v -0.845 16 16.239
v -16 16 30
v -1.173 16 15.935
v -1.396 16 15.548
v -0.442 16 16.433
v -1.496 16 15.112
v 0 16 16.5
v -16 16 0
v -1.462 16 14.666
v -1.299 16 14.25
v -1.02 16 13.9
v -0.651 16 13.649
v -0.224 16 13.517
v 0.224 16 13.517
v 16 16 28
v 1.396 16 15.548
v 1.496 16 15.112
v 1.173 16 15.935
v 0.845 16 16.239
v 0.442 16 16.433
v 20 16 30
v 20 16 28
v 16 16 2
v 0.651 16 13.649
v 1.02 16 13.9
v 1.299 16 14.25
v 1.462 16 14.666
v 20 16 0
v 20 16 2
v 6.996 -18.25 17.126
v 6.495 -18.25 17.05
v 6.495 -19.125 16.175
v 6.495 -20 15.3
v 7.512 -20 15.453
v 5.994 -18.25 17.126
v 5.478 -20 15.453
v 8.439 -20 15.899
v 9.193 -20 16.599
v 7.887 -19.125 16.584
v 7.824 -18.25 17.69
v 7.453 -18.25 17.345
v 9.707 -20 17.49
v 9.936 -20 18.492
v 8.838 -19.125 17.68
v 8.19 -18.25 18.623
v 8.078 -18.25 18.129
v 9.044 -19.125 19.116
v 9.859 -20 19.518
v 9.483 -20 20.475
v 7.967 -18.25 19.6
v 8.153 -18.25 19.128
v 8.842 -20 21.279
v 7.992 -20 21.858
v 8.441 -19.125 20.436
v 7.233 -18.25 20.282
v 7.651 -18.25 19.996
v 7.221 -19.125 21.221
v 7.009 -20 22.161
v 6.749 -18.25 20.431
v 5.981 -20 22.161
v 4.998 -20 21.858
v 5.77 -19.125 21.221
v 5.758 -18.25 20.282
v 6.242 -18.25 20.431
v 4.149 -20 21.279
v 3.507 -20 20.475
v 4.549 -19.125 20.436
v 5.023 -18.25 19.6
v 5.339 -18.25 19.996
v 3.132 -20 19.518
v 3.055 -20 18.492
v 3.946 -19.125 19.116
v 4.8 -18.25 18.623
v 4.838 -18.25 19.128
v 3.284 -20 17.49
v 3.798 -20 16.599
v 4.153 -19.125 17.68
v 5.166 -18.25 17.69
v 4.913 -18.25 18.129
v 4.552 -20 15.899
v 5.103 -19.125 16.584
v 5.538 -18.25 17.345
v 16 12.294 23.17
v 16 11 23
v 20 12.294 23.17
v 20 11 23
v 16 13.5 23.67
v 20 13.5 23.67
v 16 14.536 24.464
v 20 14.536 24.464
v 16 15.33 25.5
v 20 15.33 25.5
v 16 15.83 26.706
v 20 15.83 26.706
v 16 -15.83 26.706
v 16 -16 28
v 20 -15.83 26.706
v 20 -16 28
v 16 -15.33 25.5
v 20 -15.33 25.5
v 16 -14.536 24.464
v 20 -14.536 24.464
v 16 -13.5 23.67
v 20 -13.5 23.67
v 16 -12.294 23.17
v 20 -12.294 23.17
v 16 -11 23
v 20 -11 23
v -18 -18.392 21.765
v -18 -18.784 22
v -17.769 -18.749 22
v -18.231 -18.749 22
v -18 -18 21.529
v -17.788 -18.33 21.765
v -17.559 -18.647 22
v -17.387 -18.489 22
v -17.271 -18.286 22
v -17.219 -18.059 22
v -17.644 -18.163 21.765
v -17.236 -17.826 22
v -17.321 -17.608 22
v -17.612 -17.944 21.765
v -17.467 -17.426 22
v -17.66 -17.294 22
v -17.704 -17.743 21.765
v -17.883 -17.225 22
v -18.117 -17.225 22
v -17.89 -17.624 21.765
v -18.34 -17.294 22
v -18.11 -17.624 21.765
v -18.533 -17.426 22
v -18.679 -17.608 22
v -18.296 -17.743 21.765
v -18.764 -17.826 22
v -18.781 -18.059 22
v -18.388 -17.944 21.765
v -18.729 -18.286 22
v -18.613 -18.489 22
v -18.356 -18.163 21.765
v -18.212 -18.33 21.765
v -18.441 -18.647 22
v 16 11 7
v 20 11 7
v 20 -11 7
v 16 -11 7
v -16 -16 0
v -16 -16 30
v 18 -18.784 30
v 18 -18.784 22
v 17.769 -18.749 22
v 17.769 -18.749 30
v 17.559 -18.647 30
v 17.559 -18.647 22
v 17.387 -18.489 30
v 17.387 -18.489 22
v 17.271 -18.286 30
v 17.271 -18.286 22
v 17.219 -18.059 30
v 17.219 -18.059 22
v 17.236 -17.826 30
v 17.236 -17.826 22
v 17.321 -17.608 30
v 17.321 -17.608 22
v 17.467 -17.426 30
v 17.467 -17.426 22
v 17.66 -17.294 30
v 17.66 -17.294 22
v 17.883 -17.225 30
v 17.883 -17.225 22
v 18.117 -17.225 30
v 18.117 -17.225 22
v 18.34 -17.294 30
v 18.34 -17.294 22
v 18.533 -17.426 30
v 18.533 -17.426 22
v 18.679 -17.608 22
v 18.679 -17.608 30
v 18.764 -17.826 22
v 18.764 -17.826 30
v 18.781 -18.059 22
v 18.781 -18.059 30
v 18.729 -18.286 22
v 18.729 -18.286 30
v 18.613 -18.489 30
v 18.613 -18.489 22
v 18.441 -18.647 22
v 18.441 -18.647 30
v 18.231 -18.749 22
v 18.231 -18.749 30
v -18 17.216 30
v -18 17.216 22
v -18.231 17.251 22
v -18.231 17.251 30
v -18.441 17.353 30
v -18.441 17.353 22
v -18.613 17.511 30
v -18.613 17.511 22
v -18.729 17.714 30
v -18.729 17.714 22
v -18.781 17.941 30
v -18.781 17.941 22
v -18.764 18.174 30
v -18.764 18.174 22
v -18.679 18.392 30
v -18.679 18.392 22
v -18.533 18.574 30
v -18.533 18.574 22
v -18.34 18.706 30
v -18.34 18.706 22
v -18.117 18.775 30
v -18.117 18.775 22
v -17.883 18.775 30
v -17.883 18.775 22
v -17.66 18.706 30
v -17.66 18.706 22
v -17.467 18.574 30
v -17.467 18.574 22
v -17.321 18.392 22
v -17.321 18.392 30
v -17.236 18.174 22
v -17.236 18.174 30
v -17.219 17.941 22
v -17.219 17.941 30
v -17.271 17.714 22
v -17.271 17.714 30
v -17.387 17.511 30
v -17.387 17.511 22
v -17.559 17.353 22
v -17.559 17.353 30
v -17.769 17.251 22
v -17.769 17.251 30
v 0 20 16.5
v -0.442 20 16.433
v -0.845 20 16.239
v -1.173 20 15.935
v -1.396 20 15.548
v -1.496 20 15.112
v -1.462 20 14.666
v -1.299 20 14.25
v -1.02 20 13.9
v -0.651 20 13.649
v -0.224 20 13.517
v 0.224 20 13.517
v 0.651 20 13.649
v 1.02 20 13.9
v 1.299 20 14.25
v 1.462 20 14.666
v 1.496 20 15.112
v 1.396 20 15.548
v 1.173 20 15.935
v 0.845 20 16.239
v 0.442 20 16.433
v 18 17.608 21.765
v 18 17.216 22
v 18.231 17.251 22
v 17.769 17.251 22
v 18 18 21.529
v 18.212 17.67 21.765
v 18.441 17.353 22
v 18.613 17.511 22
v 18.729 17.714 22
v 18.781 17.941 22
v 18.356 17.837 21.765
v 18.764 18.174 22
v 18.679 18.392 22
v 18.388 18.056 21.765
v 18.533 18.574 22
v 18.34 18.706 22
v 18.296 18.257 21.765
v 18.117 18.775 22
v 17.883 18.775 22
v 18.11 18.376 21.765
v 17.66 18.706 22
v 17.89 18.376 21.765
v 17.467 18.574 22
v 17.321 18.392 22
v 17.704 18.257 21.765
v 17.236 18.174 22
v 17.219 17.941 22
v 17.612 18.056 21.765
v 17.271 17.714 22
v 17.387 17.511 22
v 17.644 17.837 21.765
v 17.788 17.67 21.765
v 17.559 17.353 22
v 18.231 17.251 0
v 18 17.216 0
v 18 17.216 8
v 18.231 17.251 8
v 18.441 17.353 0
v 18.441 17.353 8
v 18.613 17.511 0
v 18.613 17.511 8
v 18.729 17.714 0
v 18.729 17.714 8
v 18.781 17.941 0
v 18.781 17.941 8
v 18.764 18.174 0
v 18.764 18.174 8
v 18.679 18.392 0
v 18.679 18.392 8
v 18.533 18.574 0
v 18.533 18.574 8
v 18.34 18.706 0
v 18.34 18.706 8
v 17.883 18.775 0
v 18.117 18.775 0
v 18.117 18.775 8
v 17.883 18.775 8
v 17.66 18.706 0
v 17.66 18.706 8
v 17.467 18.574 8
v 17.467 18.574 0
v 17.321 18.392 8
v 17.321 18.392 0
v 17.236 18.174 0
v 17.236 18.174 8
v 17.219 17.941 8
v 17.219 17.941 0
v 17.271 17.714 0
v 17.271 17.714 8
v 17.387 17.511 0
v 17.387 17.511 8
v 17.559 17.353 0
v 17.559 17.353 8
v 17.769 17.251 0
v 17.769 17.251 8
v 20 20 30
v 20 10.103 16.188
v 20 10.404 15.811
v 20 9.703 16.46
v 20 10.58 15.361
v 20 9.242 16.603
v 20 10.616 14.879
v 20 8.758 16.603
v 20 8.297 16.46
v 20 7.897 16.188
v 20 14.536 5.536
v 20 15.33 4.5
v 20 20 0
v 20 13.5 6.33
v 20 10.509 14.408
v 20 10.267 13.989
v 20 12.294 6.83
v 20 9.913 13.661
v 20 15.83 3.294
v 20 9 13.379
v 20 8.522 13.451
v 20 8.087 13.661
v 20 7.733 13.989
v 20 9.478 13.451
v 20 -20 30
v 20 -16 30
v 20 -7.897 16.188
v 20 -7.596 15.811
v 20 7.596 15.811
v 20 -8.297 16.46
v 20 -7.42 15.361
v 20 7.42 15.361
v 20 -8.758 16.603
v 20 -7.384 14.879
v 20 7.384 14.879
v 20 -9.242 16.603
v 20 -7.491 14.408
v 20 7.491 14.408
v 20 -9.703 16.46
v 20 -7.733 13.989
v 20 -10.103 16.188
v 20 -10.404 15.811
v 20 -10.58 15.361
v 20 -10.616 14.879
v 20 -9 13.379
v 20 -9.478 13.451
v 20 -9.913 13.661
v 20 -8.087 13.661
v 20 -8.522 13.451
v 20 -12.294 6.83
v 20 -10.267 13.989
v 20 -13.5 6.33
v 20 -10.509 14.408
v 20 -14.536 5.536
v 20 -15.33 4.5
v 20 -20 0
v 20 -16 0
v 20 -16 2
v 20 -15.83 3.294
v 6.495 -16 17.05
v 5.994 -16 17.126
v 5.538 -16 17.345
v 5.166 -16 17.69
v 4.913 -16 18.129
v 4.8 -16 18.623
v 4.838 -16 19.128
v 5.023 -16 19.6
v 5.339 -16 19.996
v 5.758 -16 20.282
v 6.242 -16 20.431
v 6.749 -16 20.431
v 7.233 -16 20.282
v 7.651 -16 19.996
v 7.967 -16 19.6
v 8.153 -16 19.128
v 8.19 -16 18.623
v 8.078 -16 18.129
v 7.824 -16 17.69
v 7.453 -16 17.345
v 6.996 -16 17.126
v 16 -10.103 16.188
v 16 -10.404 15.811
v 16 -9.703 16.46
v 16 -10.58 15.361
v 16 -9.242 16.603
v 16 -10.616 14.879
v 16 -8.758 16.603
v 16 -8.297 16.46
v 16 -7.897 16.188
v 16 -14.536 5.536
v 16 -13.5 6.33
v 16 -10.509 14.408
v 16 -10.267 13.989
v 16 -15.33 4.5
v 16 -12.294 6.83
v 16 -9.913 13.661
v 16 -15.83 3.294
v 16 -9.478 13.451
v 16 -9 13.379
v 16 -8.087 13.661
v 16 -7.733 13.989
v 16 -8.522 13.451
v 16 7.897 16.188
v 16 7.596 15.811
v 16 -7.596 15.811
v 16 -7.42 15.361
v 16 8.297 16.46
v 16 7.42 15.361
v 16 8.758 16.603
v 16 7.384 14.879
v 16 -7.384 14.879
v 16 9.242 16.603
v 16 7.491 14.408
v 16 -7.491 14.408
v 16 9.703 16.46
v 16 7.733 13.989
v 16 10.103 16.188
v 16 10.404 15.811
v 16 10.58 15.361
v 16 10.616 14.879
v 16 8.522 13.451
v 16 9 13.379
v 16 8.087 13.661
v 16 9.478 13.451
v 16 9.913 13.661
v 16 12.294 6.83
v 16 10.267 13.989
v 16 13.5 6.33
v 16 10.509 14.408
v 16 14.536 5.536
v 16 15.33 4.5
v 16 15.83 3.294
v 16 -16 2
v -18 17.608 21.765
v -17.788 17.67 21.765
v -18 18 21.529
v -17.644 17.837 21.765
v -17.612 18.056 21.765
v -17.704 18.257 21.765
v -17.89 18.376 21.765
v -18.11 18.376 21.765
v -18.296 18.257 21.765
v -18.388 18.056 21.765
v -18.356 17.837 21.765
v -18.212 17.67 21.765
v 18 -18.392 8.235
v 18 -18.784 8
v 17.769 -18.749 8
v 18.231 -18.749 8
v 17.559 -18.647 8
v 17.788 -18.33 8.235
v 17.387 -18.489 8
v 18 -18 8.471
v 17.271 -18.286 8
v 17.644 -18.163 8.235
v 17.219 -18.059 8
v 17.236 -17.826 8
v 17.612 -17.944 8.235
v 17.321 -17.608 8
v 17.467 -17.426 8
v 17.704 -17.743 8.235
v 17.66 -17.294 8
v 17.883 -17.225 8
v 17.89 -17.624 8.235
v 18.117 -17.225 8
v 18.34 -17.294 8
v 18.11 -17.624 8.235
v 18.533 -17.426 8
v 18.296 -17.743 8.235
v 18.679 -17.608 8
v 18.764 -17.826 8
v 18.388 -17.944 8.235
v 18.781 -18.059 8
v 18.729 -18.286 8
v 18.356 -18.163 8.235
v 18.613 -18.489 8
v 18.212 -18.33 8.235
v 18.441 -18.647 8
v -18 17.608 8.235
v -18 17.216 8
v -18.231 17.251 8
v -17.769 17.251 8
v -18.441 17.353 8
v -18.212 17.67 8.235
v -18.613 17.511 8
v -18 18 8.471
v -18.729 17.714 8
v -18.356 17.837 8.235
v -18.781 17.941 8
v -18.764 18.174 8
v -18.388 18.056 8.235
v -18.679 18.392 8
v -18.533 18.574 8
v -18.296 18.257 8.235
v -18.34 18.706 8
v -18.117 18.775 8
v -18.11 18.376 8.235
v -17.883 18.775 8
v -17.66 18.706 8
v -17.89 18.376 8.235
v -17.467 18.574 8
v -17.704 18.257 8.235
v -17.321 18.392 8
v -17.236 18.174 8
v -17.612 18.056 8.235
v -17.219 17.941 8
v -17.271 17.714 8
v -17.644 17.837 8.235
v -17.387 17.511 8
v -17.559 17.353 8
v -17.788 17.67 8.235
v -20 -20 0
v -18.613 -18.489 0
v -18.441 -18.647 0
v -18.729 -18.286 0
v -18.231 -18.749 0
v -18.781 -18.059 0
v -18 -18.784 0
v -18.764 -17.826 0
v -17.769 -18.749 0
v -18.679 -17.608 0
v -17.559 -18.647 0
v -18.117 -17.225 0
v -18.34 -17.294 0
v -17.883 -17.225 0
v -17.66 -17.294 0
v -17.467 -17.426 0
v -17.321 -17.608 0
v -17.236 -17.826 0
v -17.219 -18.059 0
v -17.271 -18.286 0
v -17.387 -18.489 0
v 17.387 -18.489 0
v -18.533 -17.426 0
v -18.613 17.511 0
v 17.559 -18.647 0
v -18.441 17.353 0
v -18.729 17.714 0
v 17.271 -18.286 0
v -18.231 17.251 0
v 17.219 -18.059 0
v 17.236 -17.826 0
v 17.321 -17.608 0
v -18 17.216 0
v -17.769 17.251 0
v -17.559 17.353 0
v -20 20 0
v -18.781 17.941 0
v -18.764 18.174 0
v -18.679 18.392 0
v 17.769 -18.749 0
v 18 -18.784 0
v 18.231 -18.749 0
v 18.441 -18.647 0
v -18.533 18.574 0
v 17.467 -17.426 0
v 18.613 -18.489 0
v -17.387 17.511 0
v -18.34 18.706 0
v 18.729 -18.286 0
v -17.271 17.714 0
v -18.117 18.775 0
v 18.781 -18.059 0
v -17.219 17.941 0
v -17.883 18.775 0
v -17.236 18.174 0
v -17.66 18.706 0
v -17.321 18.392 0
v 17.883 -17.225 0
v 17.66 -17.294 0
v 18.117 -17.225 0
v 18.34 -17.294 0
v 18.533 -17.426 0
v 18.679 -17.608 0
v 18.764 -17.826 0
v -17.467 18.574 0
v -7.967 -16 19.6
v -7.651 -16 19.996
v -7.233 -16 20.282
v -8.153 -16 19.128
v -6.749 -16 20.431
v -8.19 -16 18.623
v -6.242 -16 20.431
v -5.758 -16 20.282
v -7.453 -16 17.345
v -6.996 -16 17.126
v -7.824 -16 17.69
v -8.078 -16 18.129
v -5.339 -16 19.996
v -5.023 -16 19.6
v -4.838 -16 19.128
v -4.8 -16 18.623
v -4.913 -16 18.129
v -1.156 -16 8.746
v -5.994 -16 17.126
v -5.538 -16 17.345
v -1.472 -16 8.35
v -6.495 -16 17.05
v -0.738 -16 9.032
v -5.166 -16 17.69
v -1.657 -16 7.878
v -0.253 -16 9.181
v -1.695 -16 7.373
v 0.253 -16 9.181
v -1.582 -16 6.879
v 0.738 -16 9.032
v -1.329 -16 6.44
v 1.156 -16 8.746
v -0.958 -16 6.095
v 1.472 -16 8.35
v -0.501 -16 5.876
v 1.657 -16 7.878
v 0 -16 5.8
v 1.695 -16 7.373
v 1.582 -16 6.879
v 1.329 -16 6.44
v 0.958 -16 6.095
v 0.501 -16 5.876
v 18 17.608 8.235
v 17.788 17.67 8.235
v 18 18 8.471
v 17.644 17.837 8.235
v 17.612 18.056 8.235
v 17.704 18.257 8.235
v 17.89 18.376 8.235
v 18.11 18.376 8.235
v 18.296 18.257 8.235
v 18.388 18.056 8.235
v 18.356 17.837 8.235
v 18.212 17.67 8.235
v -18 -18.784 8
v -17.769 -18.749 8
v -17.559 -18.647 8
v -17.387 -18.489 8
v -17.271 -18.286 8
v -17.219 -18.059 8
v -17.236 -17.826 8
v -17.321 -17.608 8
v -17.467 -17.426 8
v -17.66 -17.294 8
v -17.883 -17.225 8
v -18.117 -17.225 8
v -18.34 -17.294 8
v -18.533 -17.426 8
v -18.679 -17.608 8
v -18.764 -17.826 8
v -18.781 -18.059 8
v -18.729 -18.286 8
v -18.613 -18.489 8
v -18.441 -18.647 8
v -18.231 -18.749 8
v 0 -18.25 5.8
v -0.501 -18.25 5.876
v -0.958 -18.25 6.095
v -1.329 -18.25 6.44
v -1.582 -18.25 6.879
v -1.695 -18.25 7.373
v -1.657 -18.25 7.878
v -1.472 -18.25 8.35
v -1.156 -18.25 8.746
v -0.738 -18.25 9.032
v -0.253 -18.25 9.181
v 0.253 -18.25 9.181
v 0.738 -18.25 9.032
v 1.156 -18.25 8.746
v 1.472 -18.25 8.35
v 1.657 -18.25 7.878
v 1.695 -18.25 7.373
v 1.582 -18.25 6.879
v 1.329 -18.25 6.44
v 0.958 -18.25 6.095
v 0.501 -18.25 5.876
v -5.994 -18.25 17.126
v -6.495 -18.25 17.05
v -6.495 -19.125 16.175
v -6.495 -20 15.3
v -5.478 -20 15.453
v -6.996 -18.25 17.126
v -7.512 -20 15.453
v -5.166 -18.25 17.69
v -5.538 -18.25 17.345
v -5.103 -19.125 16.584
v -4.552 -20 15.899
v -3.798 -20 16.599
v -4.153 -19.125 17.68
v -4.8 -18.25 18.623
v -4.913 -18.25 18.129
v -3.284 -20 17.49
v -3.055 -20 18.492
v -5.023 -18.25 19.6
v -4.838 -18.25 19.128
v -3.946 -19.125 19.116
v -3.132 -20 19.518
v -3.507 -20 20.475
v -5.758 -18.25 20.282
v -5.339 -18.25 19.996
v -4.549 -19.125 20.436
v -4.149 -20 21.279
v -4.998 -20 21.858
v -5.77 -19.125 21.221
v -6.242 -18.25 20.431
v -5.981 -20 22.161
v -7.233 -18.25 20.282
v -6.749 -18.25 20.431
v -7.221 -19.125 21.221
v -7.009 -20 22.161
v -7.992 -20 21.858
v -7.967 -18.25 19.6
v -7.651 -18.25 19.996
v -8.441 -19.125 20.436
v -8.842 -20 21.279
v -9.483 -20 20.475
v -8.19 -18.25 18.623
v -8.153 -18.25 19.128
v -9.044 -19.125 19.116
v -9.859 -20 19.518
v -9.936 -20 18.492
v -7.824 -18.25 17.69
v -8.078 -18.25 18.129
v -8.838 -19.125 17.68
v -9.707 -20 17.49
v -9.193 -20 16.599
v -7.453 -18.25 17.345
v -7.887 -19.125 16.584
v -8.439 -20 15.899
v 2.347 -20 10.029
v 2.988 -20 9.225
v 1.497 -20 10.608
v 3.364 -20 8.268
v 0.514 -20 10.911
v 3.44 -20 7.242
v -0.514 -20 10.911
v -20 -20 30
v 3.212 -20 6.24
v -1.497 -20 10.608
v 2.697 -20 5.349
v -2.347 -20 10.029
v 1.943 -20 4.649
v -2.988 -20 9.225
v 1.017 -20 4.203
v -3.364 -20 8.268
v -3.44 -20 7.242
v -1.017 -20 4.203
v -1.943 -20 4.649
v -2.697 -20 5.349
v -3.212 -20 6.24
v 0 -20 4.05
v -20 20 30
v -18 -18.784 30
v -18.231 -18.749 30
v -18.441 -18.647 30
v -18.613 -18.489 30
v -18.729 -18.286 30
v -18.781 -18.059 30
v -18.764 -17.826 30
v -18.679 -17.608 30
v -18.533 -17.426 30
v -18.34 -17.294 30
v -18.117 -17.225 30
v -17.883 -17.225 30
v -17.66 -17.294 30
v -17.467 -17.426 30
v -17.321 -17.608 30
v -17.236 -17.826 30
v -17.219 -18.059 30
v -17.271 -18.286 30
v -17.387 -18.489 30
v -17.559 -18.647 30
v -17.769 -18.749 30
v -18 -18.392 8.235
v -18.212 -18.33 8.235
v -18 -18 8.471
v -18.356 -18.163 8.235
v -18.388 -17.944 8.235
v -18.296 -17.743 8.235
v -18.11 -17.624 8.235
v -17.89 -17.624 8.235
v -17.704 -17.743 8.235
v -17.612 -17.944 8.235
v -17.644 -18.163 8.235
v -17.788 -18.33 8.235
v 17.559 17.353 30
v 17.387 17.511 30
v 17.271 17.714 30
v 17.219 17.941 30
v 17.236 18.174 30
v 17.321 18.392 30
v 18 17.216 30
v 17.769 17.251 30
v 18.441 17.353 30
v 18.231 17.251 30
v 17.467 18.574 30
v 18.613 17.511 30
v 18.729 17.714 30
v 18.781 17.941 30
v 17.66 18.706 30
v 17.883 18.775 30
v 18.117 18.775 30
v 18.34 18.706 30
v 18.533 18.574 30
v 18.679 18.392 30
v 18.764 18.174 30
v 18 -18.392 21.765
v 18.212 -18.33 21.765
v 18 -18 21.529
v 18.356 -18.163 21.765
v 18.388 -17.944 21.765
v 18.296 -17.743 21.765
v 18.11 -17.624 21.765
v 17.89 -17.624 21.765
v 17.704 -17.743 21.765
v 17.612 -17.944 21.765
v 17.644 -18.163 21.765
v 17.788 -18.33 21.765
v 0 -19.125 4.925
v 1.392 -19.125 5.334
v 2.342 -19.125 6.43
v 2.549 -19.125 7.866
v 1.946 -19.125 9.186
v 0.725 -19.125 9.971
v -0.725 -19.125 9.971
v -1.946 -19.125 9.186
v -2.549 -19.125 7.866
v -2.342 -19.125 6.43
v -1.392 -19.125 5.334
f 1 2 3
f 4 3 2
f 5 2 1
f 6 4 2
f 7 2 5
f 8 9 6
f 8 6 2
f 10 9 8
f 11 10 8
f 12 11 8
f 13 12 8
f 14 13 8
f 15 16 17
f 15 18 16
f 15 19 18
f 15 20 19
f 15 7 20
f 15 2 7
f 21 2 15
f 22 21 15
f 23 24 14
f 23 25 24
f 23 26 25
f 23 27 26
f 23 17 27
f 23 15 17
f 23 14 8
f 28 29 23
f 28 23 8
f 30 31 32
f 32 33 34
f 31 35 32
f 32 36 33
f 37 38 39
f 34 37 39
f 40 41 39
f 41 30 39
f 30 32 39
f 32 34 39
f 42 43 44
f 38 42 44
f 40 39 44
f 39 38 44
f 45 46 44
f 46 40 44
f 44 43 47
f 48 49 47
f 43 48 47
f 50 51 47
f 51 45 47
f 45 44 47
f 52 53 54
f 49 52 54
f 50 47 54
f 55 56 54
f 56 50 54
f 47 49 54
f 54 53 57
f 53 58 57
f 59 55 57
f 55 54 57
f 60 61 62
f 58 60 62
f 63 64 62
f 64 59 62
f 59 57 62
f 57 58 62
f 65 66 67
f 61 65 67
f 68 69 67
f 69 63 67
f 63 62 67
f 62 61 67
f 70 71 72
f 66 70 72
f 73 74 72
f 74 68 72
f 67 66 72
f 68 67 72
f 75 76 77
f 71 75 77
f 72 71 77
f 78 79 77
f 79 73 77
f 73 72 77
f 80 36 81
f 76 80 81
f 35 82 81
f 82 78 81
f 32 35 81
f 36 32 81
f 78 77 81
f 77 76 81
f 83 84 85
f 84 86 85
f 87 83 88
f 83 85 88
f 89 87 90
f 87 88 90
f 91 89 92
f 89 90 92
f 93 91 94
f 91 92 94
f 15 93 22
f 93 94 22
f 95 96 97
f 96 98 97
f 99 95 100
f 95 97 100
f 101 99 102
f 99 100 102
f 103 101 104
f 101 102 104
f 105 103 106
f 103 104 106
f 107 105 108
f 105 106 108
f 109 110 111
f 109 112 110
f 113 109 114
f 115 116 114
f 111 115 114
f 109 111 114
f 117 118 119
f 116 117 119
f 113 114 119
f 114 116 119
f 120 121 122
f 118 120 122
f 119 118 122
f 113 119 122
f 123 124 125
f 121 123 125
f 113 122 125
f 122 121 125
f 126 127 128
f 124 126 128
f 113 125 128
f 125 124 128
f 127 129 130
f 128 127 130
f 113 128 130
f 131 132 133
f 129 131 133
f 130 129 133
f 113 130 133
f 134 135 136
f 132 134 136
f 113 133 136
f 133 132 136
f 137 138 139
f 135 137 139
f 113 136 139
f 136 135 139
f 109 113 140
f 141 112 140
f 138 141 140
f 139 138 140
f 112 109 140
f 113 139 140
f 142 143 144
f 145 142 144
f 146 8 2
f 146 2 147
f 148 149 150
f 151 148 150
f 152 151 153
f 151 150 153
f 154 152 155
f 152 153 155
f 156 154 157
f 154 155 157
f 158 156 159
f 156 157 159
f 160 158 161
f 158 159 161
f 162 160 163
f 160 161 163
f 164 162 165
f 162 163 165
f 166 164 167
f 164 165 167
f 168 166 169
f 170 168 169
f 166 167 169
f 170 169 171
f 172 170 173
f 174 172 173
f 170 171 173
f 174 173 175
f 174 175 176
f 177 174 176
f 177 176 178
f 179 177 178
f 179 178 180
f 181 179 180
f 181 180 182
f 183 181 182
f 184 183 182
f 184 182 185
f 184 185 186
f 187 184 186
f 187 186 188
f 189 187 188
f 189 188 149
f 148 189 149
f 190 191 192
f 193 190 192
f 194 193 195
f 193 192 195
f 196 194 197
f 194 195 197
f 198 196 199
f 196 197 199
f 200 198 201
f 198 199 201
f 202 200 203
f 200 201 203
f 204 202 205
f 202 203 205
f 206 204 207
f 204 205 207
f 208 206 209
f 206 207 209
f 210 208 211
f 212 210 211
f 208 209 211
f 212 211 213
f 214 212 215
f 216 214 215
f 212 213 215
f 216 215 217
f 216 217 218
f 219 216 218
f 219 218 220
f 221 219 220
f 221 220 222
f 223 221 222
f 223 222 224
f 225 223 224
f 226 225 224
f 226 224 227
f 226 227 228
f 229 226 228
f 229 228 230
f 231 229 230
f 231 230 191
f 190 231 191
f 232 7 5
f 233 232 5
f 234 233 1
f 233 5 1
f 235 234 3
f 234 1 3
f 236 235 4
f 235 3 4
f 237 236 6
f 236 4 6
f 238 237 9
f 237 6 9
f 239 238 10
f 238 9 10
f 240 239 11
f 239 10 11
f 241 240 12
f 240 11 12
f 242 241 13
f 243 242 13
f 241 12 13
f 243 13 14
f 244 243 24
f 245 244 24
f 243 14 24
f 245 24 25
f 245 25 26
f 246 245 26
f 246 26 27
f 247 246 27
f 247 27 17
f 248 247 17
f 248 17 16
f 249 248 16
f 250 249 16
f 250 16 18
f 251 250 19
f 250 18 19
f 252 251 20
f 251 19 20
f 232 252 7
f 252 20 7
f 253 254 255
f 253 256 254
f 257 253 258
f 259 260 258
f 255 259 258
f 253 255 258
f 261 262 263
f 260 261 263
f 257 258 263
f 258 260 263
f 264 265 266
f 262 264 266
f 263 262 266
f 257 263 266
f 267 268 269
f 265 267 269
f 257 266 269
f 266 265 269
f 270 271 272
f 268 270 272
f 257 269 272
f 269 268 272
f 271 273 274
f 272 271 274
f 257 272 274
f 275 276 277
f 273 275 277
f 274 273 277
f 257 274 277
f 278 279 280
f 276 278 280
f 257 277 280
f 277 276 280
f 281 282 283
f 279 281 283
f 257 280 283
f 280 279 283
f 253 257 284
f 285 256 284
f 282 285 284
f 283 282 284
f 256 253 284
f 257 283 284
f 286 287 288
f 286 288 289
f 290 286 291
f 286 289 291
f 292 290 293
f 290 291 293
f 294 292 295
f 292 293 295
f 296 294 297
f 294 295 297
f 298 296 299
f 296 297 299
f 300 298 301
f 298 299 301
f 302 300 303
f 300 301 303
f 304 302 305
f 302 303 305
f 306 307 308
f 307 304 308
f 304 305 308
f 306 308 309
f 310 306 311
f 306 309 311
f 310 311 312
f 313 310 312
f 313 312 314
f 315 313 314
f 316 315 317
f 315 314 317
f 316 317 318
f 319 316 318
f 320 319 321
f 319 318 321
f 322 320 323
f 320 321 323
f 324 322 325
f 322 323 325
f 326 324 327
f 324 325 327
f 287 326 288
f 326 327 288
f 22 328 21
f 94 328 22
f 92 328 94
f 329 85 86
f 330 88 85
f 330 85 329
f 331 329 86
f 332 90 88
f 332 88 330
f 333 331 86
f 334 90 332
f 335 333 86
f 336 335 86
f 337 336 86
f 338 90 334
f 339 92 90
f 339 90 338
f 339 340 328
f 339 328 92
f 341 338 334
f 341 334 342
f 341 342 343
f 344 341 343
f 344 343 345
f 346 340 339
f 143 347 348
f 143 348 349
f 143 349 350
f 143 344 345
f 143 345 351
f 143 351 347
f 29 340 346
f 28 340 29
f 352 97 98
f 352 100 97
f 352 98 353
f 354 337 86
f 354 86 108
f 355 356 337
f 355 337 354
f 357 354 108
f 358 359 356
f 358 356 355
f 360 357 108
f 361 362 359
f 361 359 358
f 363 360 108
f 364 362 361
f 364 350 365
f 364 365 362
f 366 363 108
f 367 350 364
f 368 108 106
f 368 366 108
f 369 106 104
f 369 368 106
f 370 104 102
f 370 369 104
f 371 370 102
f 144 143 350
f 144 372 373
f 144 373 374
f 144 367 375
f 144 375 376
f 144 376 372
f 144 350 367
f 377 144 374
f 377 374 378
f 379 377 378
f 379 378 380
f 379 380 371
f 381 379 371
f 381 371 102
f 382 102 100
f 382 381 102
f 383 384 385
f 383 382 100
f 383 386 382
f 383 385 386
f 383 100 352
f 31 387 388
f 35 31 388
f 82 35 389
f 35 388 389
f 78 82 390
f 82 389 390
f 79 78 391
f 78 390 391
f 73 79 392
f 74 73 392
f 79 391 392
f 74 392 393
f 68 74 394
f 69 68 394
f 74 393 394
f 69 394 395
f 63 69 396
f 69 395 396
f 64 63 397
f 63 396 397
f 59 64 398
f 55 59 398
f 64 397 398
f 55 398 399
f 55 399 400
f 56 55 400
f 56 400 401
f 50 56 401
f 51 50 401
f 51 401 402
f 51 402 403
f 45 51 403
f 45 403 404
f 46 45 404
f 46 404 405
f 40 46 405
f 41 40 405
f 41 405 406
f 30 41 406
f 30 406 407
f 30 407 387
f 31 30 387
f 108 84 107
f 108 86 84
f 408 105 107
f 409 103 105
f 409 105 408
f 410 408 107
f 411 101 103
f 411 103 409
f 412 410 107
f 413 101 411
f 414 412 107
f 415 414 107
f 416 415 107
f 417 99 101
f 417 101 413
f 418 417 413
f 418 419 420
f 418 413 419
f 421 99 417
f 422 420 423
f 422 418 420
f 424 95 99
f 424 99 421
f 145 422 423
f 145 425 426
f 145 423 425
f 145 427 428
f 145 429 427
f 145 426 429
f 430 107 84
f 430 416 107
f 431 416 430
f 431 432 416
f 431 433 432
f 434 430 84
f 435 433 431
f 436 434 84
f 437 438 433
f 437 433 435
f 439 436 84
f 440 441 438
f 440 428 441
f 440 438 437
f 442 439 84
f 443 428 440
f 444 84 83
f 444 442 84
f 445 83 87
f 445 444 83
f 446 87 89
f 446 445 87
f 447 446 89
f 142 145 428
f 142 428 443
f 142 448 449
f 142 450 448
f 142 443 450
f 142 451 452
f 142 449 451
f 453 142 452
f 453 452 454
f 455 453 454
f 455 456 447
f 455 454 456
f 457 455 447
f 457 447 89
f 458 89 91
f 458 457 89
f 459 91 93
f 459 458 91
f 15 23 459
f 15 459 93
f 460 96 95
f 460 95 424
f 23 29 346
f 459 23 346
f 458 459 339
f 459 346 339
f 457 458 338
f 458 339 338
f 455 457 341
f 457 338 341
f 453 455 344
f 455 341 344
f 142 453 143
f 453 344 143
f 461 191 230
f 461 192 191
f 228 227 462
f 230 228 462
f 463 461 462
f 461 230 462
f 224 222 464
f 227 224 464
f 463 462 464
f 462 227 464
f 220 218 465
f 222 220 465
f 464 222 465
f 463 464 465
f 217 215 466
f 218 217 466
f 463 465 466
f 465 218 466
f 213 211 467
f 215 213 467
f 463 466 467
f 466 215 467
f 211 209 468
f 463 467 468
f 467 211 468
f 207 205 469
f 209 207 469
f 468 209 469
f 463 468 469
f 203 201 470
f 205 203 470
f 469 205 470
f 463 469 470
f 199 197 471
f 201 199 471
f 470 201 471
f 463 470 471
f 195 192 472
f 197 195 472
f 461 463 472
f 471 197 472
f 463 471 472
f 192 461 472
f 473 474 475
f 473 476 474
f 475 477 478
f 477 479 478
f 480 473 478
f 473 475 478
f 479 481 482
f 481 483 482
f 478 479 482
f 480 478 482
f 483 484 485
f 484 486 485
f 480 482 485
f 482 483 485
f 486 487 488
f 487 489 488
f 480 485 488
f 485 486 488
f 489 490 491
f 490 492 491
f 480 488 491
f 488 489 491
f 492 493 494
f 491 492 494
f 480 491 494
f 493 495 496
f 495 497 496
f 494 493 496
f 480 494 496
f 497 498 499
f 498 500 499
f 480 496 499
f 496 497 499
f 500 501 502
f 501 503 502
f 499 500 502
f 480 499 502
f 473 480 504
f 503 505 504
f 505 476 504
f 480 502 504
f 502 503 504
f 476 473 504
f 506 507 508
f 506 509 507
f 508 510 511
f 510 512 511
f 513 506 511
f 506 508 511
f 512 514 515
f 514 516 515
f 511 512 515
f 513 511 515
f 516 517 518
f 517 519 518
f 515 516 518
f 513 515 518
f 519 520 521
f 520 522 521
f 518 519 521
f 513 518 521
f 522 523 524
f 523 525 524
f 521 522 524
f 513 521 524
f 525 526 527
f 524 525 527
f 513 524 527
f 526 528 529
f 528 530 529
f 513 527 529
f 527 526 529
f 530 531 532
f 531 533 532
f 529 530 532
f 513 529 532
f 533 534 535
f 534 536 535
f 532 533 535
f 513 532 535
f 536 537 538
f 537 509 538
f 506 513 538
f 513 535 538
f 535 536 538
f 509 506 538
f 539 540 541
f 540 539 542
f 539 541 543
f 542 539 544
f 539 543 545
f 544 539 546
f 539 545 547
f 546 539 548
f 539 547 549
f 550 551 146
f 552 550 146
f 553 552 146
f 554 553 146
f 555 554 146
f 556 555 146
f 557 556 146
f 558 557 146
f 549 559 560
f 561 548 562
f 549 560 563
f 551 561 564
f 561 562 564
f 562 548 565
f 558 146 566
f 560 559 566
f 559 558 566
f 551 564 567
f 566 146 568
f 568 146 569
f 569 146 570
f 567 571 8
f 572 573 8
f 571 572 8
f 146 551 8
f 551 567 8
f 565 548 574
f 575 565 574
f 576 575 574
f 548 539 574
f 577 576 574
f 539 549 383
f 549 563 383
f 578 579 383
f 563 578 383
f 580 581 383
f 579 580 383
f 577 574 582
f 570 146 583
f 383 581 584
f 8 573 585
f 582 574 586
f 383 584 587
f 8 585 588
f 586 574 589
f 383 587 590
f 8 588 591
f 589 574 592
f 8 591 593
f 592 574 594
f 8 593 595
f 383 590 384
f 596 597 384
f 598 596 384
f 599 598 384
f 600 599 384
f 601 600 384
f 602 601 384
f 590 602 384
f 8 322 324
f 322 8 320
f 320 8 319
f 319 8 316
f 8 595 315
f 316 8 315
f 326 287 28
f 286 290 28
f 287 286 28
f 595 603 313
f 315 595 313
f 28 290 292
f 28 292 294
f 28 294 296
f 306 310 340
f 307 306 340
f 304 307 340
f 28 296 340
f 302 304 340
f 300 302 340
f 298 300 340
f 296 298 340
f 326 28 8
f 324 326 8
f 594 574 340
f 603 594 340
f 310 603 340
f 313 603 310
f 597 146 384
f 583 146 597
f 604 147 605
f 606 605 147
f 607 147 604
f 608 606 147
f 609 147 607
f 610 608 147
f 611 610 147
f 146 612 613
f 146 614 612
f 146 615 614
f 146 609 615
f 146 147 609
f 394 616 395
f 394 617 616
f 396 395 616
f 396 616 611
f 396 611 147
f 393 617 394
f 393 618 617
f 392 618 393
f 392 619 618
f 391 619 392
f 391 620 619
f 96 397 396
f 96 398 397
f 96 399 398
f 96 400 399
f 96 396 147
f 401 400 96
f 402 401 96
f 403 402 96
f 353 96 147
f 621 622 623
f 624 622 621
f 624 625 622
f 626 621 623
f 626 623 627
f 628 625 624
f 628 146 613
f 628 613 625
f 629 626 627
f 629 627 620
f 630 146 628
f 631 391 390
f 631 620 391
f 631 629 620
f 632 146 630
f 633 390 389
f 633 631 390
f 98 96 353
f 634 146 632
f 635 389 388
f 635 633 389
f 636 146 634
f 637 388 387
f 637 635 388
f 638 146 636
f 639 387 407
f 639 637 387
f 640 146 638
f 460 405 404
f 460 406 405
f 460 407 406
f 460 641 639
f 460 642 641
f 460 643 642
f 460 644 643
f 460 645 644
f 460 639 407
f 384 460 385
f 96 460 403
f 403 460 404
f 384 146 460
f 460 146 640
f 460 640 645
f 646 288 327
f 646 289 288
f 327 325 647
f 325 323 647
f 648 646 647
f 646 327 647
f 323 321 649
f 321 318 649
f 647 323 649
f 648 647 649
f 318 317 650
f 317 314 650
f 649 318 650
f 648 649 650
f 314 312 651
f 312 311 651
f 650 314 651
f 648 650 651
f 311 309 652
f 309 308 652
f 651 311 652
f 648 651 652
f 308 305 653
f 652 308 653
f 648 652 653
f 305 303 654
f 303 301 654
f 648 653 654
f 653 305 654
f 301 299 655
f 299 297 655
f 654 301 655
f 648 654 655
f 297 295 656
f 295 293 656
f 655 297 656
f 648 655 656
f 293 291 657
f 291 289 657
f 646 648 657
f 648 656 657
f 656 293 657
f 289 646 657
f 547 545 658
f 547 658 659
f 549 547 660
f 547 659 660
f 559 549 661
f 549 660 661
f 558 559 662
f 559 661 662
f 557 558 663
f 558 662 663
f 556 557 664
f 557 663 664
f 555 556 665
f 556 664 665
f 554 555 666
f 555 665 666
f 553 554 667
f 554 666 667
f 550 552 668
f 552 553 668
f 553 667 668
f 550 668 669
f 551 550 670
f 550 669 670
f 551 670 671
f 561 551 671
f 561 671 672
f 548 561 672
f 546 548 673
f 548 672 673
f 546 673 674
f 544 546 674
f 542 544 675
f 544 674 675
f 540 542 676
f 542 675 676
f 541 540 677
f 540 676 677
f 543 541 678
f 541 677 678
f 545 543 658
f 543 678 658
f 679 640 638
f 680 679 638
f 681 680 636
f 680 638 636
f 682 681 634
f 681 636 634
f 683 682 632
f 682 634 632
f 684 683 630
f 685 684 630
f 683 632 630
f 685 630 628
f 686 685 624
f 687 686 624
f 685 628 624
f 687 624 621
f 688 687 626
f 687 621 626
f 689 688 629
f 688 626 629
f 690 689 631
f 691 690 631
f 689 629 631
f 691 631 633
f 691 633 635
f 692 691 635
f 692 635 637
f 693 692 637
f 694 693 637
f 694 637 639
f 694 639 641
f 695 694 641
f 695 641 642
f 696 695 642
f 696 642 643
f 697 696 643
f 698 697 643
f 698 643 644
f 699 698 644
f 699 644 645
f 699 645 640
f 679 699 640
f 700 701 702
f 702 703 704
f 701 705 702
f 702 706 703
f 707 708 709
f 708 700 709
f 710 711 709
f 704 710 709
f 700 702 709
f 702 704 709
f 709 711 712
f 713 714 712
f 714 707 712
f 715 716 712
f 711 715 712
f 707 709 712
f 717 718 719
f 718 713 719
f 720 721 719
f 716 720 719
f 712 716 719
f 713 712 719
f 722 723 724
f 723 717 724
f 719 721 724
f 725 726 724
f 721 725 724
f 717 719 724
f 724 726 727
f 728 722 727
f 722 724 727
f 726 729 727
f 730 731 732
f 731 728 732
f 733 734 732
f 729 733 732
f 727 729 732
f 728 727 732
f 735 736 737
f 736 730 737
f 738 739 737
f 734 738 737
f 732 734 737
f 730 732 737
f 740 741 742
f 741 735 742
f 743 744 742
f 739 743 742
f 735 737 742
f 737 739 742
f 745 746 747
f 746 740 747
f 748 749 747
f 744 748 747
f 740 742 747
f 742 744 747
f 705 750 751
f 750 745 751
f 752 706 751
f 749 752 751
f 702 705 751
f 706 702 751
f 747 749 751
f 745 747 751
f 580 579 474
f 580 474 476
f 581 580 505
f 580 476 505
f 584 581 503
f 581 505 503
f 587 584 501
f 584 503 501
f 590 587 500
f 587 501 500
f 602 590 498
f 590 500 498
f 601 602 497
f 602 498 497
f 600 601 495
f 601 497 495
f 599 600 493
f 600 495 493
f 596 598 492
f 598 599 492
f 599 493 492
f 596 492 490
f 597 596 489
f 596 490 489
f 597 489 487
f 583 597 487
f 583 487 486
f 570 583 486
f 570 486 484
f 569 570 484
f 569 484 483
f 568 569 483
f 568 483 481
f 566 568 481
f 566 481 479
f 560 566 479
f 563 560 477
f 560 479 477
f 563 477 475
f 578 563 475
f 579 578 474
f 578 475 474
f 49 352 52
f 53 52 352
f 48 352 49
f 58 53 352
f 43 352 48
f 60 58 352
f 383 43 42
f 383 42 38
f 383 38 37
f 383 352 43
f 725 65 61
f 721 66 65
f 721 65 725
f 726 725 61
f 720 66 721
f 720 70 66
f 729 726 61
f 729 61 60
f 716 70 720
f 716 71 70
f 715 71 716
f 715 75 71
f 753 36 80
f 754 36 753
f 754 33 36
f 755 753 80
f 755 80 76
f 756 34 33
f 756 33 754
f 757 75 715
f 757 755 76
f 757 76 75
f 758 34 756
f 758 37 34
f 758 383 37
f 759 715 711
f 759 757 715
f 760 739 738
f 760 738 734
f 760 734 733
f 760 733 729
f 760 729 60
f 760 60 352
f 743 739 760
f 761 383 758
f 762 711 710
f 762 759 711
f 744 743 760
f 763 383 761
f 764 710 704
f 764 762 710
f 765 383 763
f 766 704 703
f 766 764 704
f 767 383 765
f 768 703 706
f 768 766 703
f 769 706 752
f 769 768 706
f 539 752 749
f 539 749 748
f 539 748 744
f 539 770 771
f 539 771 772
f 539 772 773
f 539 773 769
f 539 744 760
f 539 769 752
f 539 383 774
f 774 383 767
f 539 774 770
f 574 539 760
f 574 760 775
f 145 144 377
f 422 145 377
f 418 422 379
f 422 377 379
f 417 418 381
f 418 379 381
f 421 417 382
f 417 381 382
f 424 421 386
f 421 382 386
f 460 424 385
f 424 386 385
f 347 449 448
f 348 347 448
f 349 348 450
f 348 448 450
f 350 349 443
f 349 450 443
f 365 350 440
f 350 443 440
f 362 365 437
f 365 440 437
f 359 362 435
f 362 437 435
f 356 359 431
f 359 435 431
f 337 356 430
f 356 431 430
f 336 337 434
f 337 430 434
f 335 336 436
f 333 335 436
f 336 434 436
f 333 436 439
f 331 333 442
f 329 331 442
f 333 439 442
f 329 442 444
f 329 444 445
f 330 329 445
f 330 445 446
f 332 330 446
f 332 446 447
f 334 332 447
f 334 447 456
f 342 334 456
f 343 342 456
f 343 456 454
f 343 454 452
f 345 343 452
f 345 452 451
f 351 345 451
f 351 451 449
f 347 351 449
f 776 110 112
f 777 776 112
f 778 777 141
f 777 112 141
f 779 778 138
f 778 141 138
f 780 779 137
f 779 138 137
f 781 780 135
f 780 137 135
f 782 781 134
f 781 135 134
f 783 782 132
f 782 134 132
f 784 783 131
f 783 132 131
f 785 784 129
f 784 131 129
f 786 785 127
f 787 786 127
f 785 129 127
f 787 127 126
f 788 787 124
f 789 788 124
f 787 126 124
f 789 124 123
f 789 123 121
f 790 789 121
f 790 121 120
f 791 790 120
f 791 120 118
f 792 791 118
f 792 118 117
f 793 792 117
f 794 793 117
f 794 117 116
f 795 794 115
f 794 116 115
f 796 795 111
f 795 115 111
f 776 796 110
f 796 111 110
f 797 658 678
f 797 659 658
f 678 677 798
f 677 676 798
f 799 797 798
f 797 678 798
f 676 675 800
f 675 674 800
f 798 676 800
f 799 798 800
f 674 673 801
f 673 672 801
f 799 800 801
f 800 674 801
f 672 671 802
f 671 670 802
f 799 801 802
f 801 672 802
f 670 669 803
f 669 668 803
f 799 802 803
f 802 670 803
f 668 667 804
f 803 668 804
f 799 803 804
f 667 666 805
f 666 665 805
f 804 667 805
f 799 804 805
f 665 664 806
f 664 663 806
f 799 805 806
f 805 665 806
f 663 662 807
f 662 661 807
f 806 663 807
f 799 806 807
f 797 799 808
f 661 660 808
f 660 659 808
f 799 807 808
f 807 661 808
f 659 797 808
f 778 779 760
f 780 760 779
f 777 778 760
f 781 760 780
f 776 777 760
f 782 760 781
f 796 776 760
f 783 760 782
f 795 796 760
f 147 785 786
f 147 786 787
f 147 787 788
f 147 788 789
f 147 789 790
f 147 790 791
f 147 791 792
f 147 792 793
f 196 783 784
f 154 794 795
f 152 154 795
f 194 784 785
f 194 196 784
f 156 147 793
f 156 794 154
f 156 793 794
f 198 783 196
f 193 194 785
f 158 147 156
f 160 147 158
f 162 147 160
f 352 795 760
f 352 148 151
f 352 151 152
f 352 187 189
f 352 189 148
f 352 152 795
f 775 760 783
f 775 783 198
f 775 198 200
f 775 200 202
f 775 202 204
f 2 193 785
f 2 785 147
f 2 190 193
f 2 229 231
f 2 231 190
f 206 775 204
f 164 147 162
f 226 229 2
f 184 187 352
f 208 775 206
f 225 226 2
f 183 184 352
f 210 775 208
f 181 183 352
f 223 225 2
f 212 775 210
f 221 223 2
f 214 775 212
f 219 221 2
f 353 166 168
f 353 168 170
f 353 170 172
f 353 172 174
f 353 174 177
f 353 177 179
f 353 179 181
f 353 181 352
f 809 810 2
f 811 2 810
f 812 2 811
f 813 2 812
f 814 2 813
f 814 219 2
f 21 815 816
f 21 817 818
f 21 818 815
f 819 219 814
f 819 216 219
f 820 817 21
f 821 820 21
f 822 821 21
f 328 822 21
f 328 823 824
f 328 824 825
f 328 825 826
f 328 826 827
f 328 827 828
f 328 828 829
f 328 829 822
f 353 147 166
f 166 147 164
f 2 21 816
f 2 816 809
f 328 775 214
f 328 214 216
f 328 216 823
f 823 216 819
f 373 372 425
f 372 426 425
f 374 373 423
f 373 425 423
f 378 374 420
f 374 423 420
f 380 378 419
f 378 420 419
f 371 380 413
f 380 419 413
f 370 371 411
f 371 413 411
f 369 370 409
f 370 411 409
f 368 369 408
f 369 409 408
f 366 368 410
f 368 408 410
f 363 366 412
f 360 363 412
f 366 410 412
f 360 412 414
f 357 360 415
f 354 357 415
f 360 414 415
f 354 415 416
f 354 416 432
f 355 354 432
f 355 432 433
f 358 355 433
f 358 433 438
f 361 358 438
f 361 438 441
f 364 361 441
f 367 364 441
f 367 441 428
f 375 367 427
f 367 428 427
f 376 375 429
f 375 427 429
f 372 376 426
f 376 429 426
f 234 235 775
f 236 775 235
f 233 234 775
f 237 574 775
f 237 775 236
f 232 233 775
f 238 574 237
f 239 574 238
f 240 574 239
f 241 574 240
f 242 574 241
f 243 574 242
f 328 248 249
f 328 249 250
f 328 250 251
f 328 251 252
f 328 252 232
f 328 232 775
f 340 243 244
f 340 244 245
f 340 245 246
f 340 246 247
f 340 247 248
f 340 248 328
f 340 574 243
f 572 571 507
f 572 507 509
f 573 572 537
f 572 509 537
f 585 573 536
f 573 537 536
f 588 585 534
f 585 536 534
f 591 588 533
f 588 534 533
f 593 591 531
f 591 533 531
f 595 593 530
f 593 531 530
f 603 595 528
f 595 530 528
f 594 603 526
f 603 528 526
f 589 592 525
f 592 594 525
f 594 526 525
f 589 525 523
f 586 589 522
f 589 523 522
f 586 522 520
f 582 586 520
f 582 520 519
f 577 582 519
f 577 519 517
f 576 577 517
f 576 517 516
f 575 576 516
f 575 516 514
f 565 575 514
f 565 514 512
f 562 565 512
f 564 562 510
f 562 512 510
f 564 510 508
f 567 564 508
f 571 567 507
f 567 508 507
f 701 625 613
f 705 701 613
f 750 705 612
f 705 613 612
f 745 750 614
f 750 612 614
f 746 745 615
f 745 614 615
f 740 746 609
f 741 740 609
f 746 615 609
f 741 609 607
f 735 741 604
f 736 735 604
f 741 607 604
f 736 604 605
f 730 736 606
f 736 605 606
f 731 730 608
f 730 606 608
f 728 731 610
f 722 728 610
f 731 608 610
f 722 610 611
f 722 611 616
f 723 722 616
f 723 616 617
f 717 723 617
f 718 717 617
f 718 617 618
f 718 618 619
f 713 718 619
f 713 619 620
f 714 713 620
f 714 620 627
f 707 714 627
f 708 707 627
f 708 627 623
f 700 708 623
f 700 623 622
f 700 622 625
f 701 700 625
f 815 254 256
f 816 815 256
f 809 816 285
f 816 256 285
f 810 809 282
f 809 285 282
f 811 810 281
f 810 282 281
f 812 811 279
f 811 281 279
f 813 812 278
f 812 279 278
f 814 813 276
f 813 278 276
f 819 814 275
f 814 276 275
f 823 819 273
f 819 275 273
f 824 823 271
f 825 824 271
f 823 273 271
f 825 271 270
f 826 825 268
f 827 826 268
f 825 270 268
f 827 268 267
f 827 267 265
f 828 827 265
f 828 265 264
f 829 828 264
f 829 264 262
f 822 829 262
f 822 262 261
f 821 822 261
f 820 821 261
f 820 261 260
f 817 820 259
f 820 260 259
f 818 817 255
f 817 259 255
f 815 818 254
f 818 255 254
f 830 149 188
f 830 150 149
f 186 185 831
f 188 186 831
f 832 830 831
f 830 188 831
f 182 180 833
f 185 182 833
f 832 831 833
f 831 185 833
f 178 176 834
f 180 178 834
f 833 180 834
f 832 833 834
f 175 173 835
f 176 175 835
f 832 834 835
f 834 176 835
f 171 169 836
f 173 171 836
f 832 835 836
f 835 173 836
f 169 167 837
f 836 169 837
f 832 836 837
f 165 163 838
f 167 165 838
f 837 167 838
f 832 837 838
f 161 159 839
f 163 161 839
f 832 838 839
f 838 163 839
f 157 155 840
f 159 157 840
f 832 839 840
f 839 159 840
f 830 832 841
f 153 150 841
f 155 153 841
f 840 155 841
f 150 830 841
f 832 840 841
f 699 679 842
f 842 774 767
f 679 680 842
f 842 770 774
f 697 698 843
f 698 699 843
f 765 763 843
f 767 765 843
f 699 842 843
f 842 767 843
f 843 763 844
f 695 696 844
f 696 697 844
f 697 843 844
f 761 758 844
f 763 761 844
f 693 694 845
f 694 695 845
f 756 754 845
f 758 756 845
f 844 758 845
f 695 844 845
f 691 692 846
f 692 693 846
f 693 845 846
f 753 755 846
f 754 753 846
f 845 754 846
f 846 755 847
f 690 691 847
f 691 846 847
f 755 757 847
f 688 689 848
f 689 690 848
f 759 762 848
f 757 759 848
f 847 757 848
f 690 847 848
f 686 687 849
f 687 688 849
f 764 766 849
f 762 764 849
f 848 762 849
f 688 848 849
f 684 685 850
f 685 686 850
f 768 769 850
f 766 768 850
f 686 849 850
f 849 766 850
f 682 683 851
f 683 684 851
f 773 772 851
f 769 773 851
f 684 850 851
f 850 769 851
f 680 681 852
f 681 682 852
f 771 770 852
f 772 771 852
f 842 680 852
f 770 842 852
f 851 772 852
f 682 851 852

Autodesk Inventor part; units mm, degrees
ref_plane "YZ Plane" through (0, 0, 0) normal (1, 0, 0) x (0, 1, 0)
ref_plane "XZ Plane" through (0, 0, 0) normal (0, 1, 0) x (-1, 0, 0)
sketch "Skizze1" plane through (0, 0, 0) normal (0, 0, 1) x (1, 0, 0)
  line L0 (-20, 20) -> (20, 20)
  line L1 (20, 20) -> (20, -20)
  line L2 (20, -20) -> (-20, -20)
  line L3 (-20, -20) -> (-20, 20)
  line L4 (-28, 0) -> (28, 0) projected
  line L5 (0, -28) -> (0, 28) projected
  line L6 (16, 16) -> (-16, 16)
  line L7 (-16, 16) -> (-16, -16)
  line L8 (-16, -16) -> (16, -16)
  line L9 (16, -16) -> (16, 16)
  point P0 (0, 0)
  dimension "d0" = 40
  dimension "d1" = 4
extrude "Extrusion1" add sketch "Skizze1" along normal blind 30 contours L0 L5 L6 L7 L4 L3 | L0 L1 L4 L9 L6 L5 | L4 L7 L8 L5 L2 L3 | L1 L2 L5 L8 L9 L4
sketch "Skizze2" plane through (20, -20, 0) normal (1, 0, 0) x (0, 0, -1)
  line L0 (-30, 40) -> (-30, 0) projected
  line L1 (0, 0) -> (-30, 0) projected
  line L2 (0, 40) -> (-30, 40) projected
  line L3 (0, -8) -> (0, 48) projected
  line L4 (6, 20) -> (-36, 20) projected
  line L5 (-30, 36) -> (-28, 36)
  line L6 (-23, 31) -> (-23, 9)
  line L7 (-28, 4) -> (-30, 4)
  line L8 (-30, 4) -> (-30, 36)
  line L9 (0, 36) -> (-2, 36)
  line L10 (-7, 31) -> (-7, 9)
  line L11 (-2, 4) -> (0, 4)
  line L12 (0, 4) -> (0, 36)
  line L13 (-15, 40) -> (-15, 0)
  line L14 (0, 4) -> (-30, 4) projected
  arc A0 (-23, 31) -> (-28, 36) centre (-28, 31) ccw
  arc A1 (-28, 4) -> (-23, 9) centre (-28, 9) ccw
  arc A2 (-7, 9) -> (-2, 4) centre (-2, 9) ccw
  arc A3 (-2, 36) -> (-7, 31) centre (-2, 31) ccw
  point P0 (0, 20)
  dimension "d5" = 16
  dimension "d6" = 5
extrude "Extrusion2" cut sketch "Skizze2" against normal up to surface (4 mm away) contours L5 A0 L6 L4 L0 | L4 L6 A1 L7 L0 | L3 L4 L10 A3 L9 | L4 L3 L11 A2 L10
sketch "Skizze3" plane through (-20, -20, 0) normal (0, -1, 0) x (1, 0, 0)
  line L0 (40, 30) -> (0, 30) projected
  line L1 (0, 0) -> (0, 30) projected
  line L2 (40, 0) -> (40, 30) projected
  line L3 (20, 30) -> (20, 0)
  line L4 (0, 15) -> (40, 15)
  circle A0 centre (20, 15) radius 7.5
  line L5 (13.5048, 18.75) -> (20, 15)
  line L6 (20, 15) -> (26.4952, 18.75)
  point P0 (20, 7.5)
  dimension "d9" = 15
  dimension "d10" = 60
  dimension "d11" = 60
hole "Bohrung1" at (0, -20, 7.5) at (-6.4952, -20, 18.75) at (6.4952, -20, 18.75) direction (0, 1, 0) diameter 3.4 end up to surface countersink diameter 6.9 countersink angle 90
sketch "Skizze4" plane through (20, -20, 0) normal (1, 0, 0) x (0, 0, -1)
  circle A0 centre (-15, 29) radius 2.25 projected
  circle A1 centre (-15, 11) radius 2.25 projected
  point P0 (0, 20)
hole "Bohrung2" at (20, 9, 15) at (20, -9, 15) direction (-1, 0, 0) diameter 3.242 end up to surface thread size "M4x0.7" class "6H" standard "ISO Metric profile"
sketch "Skizze5" plane through (0, 0, 30) normal (0, 0, 1) x (1, 0, 0)
  line L0 (-20, 20) -> (20, 20) projected
  line L1 (-20, -20) -> (-20, 20) projected
  line L2 (20, -20) -> (-20, -20) projected
  line L3 (20, -16) -> (20, -20) projected
  line L4 (-18, 18) -> (18, 18)
  line L5 (18, 18) -> (18, -18)
  line L6 (18, -18) -> (-18, -18)
  line L7 (-18, -18) -> (-18, 18)
  point P0 (0, 0)
  dimension "d29" = 2
  dimension "d30" = 2
  dimension "d31" = 2
  dimension "d32" = 2
hole "Bohrung3" at (-18, 18, 30) at (18, 18, 30) at (18, -18, 30) at (-18, -18, 30) direction (0, 0, -1) diameter 1.567 depth 8 tip angle 118 thread size "M2x0.4" class "6H" standard "ISO Metric profile"
ref_plane "Arbeitsebene1" through (0, 0, 15) normal (0, 0, 1) x (1, 0, 0)
mirror "Spiegeln1" about plane through (0, 0, 15) normal (0, 0, 1) of "Bohrung3"
sketch "Skizze6" plane through (-20, 20, 0) normal (0, 1, 0) x (1, 0, 0)
  line L0 (0, -30) -> (40, -30) projected
  line L1 (40, 0) -> (40, -30) projected
  line L2 (0, 0) -> (0, -30) projected
  line L3 (0, -15) -> (40, -15)
  line L4 (20, 0) -> (20, -30)
  point P0 (20, -15)
hole "Bohrung4" at (0, 20, 15) direction (0, -1, 0) diameter 3 depth 8 tip angle 118
properties part number "13_0204_015"
